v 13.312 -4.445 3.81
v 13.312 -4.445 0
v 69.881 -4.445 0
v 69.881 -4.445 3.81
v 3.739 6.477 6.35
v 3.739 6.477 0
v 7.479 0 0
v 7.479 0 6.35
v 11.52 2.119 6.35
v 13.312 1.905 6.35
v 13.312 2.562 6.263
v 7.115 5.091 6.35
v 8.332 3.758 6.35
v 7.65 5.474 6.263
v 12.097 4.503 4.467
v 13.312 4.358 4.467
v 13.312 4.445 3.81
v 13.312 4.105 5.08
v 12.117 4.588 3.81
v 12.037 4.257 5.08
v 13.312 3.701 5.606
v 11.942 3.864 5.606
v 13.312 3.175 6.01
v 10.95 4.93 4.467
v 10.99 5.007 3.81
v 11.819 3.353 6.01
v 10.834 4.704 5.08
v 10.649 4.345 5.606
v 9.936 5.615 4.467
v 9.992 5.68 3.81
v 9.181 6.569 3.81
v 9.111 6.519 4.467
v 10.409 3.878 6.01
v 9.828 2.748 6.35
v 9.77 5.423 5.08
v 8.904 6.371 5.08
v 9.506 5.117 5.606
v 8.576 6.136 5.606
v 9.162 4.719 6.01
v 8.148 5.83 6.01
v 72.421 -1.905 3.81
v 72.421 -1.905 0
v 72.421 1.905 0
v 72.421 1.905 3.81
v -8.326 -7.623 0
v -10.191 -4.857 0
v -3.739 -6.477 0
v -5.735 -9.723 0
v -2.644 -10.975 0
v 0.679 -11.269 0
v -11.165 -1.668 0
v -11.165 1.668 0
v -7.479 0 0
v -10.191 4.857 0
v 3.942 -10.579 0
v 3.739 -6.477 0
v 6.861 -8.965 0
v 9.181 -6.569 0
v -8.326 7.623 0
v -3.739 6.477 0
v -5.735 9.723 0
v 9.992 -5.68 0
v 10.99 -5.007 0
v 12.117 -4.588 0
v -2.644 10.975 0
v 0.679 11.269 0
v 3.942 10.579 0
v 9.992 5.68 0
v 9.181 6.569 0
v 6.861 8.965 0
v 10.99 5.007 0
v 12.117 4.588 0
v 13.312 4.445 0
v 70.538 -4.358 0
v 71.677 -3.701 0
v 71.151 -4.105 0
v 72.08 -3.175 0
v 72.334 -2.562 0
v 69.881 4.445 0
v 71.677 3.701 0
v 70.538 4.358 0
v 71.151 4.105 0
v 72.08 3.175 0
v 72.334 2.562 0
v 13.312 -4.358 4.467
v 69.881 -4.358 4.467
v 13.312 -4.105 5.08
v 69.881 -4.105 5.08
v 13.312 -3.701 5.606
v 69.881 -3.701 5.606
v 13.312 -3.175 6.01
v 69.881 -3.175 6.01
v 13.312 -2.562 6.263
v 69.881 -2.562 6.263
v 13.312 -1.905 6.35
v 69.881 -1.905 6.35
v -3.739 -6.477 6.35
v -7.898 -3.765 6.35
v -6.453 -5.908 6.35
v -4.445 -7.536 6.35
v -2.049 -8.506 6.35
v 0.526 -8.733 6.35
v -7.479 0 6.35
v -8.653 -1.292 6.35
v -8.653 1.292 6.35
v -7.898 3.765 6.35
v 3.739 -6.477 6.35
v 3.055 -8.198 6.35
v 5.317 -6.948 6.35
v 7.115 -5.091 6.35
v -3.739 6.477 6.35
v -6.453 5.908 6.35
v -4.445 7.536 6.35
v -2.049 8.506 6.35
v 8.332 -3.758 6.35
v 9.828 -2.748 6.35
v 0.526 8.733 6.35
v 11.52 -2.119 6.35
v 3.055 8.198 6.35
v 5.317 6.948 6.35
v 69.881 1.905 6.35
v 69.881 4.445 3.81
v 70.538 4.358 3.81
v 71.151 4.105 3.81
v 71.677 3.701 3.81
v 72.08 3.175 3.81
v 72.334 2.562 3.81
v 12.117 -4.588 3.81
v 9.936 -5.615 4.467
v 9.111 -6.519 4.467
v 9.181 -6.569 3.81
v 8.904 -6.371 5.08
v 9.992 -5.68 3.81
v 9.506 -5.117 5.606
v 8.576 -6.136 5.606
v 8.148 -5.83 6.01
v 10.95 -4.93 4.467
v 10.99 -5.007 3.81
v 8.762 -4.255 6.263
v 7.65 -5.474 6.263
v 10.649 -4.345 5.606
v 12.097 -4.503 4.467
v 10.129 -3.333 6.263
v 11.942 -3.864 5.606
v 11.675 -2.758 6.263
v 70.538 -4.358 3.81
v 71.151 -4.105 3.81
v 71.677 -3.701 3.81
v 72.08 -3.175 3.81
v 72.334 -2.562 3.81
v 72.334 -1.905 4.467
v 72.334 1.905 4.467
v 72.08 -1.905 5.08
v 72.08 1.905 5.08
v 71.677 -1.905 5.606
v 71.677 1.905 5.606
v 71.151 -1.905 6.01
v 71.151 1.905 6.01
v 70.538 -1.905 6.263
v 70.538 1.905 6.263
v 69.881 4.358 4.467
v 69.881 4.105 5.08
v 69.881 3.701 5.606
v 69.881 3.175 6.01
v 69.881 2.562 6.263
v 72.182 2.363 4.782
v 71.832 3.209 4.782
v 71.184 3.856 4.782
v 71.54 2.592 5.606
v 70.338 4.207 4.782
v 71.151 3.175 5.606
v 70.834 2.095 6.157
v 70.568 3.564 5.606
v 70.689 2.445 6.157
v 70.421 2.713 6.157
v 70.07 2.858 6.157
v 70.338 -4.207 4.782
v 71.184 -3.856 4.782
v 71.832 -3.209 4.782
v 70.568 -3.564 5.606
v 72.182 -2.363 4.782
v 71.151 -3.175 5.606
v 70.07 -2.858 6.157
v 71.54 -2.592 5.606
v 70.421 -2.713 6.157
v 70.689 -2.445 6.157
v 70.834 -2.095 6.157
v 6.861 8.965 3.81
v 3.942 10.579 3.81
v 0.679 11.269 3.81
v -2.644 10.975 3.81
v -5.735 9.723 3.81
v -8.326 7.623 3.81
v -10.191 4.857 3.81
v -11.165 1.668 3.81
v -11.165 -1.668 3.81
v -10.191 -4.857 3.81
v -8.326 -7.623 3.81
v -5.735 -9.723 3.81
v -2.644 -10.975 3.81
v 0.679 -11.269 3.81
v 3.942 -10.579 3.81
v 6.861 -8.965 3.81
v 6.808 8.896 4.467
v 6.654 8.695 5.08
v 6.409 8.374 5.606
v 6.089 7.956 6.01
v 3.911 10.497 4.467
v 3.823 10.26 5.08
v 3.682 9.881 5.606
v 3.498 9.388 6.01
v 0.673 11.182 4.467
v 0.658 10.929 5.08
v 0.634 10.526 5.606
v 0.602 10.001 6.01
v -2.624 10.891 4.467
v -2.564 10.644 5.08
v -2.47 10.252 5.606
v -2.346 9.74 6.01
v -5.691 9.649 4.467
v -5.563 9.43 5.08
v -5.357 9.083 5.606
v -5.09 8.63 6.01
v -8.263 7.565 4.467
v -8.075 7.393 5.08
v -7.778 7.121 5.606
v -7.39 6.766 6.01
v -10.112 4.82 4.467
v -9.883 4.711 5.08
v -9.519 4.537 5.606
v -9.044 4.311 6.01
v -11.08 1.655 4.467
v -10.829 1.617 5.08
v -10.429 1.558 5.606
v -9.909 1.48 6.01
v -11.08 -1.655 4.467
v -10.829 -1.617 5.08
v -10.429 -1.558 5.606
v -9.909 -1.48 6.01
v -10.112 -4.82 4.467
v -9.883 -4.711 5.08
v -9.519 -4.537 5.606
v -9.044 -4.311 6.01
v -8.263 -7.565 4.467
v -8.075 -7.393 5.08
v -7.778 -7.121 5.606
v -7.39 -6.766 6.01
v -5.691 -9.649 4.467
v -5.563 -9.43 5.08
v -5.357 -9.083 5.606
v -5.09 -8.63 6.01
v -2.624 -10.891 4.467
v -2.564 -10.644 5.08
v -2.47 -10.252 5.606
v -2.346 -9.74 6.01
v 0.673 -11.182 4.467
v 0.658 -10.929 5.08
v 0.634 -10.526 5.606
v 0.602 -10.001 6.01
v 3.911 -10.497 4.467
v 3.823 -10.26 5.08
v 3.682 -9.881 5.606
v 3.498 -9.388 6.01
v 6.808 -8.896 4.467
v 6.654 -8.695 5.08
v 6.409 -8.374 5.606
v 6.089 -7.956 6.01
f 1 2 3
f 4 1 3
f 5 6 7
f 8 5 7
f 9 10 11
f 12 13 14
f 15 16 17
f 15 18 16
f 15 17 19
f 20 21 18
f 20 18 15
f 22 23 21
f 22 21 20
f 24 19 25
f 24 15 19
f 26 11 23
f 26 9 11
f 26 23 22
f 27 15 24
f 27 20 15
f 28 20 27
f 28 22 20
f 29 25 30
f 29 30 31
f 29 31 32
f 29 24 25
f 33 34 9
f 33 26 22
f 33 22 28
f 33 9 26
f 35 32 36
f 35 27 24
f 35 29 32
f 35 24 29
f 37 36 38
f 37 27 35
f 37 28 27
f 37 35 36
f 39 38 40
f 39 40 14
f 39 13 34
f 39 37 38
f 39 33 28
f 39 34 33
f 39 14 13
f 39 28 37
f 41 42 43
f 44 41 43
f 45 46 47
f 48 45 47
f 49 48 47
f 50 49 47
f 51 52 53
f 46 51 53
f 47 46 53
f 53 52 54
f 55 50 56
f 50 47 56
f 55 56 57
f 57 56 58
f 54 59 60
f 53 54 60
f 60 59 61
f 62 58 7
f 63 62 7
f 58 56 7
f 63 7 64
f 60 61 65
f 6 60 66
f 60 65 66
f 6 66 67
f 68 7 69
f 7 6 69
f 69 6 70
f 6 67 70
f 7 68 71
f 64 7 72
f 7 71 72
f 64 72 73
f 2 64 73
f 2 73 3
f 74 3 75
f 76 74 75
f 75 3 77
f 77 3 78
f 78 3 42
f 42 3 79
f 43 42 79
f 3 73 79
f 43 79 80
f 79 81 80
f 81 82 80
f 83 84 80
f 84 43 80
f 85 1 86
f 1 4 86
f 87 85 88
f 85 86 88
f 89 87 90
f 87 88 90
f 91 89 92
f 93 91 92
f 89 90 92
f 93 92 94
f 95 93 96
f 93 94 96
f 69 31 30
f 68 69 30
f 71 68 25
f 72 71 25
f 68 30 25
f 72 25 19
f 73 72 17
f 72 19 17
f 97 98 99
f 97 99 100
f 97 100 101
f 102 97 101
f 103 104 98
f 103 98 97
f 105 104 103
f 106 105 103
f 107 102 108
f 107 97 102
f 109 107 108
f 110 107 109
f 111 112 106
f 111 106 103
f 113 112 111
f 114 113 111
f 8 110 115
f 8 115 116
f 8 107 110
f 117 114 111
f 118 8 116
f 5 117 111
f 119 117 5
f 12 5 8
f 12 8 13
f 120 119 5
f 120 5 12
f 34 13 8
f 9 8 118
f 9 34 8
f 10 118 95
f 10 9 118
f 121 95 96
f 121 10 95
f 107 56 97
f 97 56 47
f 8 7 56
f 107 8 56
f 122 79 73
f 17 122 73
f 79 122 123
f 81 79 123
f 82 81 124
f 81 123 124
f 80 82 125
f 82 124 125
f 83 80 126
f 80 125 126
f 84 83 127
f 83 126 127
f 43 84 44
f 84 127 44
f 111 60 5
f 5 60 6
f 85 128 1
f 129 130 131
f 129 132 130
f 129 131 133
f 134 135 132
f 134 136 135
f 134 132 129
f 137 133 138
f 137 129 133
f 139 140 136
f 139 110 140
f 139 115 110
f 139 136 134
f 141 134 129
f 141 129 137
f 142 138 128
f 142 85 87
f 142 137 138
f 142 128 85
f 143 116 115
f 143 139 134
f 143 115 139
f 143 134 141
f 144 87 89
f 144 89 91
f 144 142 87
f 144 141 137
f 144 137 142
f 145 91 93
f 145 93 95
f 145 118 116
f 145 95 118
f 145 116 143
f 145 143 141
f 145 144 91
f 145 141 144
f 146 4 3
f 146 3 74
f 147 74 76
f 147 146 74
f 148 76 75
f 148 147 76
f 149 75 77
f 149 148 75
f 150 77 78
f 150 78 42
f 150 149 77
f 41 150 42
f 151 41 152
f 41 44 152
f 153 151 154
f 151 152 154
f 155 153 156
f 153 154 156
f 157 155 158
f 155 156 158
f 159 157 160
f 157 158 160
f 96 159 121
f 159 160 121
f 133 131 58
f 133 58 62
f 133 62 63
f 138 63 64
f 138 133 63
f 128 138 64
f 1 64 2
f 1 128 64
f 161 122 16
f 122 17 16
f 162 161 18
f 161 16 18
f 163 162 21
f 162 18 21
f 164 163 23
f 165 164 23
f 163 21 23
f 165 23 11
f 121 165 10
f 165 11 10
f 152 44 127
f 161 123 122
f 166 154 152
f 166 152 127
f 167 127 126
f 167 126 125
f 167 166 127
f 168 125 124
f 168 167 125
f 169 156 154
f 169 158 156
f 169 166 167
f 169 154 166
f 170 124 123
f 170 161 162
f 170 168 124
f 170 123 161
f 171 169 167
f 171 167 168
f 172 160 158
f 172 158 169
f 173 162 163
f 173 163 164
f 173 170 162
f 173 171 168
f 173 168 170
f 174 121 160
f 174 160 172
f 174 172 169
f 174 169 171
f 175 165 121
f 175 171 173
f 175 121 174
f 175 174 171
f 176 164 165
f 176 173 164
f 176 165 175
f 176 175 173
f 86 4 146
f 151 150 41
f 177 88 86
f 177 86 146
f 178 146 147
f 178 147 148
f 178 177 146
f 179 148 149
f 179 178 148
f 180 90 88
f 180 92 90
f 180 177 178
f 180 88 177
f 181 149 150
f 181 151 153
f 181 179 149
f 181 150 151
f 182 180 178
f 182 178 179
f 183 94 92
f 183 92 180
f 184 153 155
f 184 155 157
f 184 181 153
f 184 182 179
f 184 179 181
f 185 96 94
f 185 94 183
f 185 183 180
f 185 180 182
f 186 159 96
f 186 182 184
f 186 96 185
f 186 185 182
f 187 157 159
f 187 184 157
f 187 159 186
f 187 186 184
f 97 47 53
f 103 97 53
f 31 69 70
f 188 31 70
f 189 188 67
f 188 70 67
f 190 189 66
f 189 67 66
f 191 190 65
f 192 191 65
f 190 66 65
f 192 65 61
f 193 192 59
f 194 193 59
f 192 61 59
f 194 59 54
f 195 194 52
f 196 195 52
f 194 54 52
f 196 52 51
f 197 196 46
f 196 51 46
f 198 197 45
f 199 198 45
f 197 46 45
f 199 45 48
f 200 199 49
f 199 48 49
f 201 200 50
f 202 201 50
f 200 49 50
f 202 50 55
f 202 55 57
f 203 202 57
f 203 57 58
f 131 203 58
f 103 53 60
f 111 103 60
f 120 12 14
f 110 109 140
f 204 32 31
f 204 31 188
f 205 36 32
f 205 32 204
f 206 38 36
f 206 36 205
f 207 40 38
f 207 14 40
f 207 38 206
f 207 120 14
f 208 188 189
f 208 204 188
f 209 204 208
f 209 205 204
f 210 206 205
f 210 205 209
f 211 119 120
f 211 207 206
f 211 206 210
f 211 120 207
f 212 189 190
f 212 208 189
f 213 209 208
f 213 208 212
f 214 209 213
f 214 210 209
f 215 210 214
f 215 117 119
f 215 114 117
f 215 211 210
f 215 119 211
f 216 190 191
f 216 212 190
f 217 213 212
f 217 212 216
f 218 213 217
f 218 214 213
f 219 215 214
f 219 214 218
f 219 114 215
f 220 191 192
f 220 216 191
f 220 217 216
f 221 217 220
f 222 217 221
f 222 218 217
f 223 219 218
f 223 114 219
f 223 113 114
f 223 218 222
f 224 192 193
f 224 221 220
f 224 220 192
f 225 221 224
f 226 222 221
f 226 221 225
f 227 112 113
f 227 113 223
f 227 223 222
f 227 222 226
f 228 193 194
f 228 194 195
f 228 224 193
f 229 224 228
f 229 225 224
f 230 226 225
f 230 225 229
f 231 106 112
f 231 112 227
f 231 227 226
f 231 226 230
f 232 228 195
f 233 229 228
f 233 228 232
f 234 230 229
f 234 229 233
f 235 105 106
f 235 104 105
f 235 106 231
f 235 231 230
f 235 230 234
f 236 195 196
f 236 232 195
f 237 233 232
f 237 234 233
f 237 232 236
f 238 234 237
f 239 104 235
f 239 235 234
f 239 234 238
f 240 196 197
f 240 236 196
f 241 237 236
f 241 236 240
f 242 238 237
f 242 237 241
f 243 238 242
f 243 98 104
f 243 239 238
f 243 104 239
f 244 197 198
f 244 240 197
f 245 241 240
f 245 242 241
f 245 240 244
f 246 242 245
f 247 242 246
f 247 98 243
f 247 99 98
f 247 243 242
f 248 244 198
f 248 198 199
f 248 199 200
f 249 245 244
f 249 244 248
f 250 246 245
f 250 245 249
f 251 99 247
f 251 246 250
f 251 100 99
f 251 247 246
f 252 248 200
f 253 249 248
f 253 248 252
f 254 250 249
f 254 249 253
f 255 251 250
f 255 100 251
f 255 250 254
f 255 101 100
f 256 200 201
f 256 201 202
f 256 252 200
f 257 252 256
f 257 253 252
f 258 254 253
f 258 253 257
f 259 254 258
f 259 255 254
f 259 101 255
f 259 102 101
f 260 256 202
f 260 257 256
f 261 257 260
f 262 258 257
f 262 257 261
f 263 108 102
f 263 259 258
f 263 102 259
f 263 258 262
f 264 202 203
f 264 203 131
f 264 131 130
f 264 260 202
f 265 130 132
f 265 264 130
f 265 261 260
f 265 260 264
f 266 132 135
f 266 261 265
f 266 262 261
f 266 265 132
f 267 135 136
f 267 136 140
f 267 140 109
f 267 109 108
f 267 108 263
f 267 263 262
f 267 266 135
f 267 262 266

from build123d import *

# Parameters (mm, degrees)
F1_DEPTH = 6.35
F2_R     = 5.08
F3_R     = 2.54
F4_R     = 2.54


with BuildPart() as f1:
    # F0 (on Top) → F1 (new body)
    with BuildSketch(Plane.XY):
        with BuildLine():
            Line((8.920526, 4.445), (10.377061, 4.445))
            ThreePointArc((10.377061, 4.445), (-11.288995, 0), (10.377061, -4.445))
            Line((10.377061, -4.445), (8.920526, -4.445))
            Line((8.920526, -4.445), (8.920526, 4.445))
        make_face()
        Polygon((3.739498, -6.477), (-3.739498, -6.477), (-7.478995, 0), (-3.739498, 6.477), (3.739498, 6.477), (7.478995, 0), align=None, mode=Mode.SUBTRACT)
        with BuildLine():
            ThreePointArc((10.377061, -4.445), (11.058662, -2.268791), (11.288995, 0))
            ThreePointArc((11.288995, 0), (11.058662, 2.268791), (10.377061, 4.445))
            Line((10.377061, 4.445), (8.920526, 4.445))
            Line((8.920526, 4.445), (8.920526, -4.445))
            Line((8.920526, -4.445), (10.377061, -4.445))
        make_face()
        with BuildLine():
            ThreePointArc((10.377061, 4.445), (11.058662, 2.268791), (11.288995, 0))
            ThreePointArc((11.288995, 0), (11.058662, -2.268791), (10.377061, -4.445))
            Line((10.377061, -4.445), (72.420526, -4.445))
            Line((72.420526, -4.445), (72.420526, 4.445))
            Line((72.420526, 4.445), (10.377061, 4.445))
        make_face()
    extrude(amount=F1_DEPTH)

    # F2
    f2_edges = [f1.edges().sort_by_distance(p)[0] for p in [
        (10.377061, -4.445, 3.175),
        (10.377061, 4.445, 3.175),
    ]]
    fillet(f2_edges, radius=F2_R)

    # F3
    f3_edges = [f1.edges().sort_by_distance(p)[0] for p in [
        (72.420526, 4.445, 3.175),
        (72.420526, -4.445, 3.175),
    ]]
    fillet(f3_edges, radius=F3_R)

    # F4
    f4_edges = [f1.edges().sort_by_distance(p)[0] for p in [
        (41.596433, -4.445, 6.35),
    ]]
    fillet(f4_edges, radius=F4_R)


solid = f1.part
